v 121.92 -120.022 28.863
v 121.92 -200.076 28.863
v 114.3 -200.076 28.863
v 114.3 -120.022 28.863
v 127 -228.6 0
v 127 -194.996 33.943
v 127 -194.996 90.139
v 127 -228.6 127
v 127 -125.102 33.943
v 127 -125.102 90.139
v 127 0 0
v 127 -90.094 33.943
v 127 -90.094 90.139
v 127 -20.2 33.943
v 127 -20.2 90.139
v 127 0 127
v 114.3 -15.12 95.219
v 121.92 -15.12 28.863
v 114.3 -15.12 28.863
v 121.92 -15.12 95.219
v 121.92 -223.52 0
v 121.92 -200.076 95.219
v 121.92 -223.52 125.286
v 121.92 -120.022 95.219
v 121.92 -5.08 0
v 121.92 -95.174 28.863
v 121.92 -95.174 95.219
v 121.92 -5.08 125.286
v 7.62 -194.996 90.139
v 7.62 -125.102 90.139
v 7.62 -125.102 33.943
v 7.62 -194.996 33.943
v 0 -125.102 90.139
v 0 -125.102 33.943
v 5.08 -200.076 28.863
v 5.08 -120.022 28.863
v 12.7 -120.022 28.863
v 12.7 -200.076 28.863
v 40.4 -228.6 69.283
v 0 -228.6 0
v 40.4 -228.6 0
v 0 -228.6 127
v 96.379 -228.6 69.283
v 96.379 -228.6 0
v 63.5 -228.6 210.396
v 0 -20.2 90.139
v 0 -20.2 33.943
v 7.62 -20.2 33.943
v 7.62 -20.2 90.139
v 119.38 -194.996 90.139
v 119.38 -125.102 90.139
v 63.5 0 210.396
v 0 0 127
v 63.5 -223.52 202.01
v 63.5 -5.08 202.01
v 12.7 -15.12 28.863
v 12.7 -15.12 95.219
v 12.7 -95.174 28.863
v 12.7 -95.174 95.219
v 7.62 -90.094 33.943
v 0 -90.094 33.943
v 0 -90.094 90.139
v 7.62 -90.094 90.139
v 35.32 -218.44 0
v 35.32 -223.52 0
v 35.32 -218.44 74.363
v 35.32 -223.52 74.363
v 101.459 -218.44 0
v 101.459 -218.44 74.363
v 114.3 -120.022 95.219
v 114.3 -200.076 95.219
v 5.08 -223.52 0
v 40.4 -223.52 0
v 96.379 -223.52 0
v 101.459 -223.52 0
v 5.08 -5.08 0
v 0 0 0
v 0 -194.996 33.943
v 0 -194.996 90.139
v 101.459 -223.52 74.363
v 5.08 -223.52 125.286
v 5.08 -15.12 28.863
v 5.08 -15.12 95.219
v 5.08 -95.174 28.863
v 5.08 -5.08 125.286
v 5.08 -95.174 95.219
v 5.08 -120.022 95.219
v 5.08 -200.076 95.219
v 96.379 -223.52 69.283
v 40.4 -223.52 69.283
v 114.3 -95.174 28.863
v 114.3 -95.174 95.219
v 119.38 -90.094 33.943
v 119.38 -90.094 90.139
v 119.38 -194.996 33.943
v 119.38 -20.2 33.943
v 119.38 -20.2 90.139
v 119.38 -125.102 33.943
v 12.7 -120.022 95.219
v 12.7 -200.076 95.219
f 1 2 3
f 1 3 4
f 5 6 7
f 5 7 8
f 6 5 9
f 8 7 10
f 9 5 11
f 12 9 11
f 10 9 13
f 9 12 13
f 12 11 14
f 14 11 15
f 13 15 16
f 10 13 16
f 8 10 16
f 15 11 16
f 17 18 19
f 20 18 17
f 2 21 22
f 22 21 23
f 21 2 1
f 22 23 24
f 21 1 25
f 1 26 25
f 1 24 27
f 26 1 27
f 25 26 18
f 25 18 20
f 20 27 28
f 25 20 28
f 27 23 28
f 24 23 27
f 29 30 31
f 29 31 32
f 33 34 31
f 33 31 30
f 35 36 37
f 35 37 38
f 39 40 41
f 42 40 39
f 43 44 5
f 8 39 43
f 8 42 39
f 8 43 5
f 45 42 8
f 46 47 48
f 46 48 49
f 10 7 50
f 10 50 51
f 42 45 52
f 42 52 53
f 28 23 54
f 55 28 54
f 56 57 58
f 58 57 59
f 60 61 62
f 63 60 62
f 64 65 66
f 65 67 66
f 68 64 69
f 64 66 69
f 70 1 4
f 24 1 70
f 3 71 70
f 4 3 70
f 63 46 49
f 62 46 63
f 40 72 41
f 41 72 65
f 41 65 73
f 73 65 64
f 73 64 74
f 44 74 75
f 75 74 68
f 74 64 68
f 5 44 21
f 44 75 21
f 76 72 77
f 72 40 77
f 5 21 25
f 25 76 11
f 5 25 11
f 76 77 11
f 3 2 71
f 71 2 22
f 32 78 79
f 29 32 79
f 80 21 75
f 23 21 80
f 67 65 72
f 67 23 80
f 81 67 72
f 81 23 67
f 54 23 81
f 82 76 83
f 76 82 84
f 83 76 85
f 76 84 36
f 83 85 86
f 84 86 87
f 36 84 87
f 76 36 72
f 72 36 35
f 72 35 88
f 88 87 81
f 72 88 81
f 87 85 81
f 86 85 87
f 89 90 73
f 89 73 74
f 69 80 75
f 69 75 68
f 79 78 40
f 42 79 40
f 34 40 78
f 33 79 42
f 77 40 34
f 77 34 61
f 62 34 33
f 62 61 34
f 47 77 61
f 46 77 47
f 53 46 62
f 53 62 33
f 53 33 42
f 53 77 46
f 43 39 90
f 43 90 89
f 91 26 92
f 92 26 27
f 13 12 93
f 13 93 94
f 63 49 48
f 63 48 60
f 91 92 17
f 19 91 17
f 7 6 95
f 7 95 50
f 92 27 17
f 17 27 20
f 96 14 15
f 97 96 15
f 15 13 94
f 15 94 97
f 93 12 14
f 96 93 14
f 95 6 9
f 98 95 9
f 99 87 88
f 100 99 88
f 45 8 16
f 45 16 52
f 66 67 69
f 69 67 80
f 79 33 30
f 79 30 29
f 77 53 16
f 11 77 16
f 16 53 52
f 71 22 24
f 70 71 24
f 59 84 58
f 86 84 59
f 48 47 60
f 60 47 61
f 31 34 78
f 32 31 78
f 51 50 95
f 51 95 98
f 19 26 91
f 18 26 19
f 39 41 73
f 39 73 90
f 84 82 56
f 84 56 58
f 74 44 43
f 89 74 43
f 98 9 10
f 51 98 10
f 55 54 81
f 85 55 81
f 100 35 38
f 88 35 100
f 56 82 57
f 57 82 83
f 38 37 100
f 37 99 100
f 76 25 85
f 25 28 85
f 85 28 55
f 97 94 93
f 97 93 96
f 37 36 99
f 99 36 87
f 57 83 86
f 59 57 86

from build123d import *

# Parameters (mm, degrees)
F0_W      = 127
F0_H      = 127
F1_DEPTH  = 127
F2_DEPTH  = 25.4
F3_DEPTH  = 76.2
F5_DEPTH  = 228.6
F6_W      = 55.9784695506
F6_H      = 69.2825764418
F7_DEPTH  = 5.08
F8_W      = 69.8941033334
F8_H      = 56.1961345005
F9_DEPTH  = 7.62
F11_W     = 69.8941033334
F11_H     = 56.1961345005
F10_W     = 69.8941033334
F10_H     = 56.1961345005
F12_DEPTH = 7.62
F13_T     = -5.08


# Not quite as in the source:
# - a shell that OpenCascade refuses in one call is made with other operations: the cavity is built on its own and cut out


with BuildPart() as f1:
    # F0 (on Top) → F1 (new body)
    with BuildSketch(Plane.XY):
        with Locations((63.5, -63.5)):
            Rectangle(F0_W, F0_H)
    extrude(amount=F1_DEPTH)

    # F2 (add): a face of the model
    f2_faces = [f1.faces().sort_by_distance(p)[0] for p in [
        (63.5, -127, 63.5),
    ]]
    extrude(f2_faces, amount=F2_DEPTH)

    # F3 (add): a face of the model
    f3_faces = [f1.faces().sort_by_distance(p)[0] for p in [
        (63.5, -152.4, 63.5),
    ]]
    extrude(f3_faces, amount=F3_DEPTH)

    # F4 (on face) → F5 (join)
    with BuildSketch(Plane.XZ.offset(228.6)):
        Polygon((63.5, 210.3958427906), (63.5, 127), (127, 127), align=None)
        Polygon((63.5, 210.3958427906), (0, 127), (63.5, 127), align=None)
    extrude(amount=-F5_DEPTH)

    # F6 (on face) → F7 (cut)
    with BuildSketch(Plane.XZ.offset(228.6)):
        with Locations((68.3894939721, 34.6412882209)):
            Rectangle(F6_W, F6_H)
    extrude(amount=-F7_DEPTH, mode=Mode.SUBTRACT)

    # F8 (on face) → F9 (cut)
    with BuildSketch(Plane(origin=(0, 0, 0), x_dir=(0, -1, 0), z_dir=(-1, 0, 0))):
        with Locations((55.1468739286, 62.0407964849)):
            Rectangle(F8_W, F8_H)
        with Locations((160.0488739286, 62.0407964849)):
            Rectangle(F8_W, F8_H)
    extrude(amount=-F9_DEPTH, mode=Mode.SUBTRACT)

    # F11 (on face) + F10 (on face) → F12 (cut)
    with BuildSketch(Plane.YZ.offset(127)):
        with Locations((-160.0488739286, 62.0407964849)):
            Rectangle(F11_W, F11_H)
    with BuildSketch(Plane.YZ.offset(127)):
        with Locations((-55.1468739286, 62.0407964849)):
            Rectangle(F10_W, F10_H)
    extrude(amount=-F12_DEPTH, mode=Mode.SUBTRACT)

    # F13: a shell. OpenCascade refuses it in one call, so the cavity is built on its own and cut out:
    # the body offset inwards by the wall thickness, plus a prism from it out through each open face.
    f13_core = offset(f1.part, amount=F13_T, kind=Kind.INTERSECTION, mode=Mode.PRIVATE)
    f13_exits = [f13_core.faces().sort_by_distance(p)[0] for p in [
        (63.434775, -112.87691, 5.08),
    ]]
    add(f13_core, mode=Mode.SUBTRACT)
    extrude(f13_exits, amount=-F13_T, mode=Mode.SUBTRACT)


solid = f1.part
